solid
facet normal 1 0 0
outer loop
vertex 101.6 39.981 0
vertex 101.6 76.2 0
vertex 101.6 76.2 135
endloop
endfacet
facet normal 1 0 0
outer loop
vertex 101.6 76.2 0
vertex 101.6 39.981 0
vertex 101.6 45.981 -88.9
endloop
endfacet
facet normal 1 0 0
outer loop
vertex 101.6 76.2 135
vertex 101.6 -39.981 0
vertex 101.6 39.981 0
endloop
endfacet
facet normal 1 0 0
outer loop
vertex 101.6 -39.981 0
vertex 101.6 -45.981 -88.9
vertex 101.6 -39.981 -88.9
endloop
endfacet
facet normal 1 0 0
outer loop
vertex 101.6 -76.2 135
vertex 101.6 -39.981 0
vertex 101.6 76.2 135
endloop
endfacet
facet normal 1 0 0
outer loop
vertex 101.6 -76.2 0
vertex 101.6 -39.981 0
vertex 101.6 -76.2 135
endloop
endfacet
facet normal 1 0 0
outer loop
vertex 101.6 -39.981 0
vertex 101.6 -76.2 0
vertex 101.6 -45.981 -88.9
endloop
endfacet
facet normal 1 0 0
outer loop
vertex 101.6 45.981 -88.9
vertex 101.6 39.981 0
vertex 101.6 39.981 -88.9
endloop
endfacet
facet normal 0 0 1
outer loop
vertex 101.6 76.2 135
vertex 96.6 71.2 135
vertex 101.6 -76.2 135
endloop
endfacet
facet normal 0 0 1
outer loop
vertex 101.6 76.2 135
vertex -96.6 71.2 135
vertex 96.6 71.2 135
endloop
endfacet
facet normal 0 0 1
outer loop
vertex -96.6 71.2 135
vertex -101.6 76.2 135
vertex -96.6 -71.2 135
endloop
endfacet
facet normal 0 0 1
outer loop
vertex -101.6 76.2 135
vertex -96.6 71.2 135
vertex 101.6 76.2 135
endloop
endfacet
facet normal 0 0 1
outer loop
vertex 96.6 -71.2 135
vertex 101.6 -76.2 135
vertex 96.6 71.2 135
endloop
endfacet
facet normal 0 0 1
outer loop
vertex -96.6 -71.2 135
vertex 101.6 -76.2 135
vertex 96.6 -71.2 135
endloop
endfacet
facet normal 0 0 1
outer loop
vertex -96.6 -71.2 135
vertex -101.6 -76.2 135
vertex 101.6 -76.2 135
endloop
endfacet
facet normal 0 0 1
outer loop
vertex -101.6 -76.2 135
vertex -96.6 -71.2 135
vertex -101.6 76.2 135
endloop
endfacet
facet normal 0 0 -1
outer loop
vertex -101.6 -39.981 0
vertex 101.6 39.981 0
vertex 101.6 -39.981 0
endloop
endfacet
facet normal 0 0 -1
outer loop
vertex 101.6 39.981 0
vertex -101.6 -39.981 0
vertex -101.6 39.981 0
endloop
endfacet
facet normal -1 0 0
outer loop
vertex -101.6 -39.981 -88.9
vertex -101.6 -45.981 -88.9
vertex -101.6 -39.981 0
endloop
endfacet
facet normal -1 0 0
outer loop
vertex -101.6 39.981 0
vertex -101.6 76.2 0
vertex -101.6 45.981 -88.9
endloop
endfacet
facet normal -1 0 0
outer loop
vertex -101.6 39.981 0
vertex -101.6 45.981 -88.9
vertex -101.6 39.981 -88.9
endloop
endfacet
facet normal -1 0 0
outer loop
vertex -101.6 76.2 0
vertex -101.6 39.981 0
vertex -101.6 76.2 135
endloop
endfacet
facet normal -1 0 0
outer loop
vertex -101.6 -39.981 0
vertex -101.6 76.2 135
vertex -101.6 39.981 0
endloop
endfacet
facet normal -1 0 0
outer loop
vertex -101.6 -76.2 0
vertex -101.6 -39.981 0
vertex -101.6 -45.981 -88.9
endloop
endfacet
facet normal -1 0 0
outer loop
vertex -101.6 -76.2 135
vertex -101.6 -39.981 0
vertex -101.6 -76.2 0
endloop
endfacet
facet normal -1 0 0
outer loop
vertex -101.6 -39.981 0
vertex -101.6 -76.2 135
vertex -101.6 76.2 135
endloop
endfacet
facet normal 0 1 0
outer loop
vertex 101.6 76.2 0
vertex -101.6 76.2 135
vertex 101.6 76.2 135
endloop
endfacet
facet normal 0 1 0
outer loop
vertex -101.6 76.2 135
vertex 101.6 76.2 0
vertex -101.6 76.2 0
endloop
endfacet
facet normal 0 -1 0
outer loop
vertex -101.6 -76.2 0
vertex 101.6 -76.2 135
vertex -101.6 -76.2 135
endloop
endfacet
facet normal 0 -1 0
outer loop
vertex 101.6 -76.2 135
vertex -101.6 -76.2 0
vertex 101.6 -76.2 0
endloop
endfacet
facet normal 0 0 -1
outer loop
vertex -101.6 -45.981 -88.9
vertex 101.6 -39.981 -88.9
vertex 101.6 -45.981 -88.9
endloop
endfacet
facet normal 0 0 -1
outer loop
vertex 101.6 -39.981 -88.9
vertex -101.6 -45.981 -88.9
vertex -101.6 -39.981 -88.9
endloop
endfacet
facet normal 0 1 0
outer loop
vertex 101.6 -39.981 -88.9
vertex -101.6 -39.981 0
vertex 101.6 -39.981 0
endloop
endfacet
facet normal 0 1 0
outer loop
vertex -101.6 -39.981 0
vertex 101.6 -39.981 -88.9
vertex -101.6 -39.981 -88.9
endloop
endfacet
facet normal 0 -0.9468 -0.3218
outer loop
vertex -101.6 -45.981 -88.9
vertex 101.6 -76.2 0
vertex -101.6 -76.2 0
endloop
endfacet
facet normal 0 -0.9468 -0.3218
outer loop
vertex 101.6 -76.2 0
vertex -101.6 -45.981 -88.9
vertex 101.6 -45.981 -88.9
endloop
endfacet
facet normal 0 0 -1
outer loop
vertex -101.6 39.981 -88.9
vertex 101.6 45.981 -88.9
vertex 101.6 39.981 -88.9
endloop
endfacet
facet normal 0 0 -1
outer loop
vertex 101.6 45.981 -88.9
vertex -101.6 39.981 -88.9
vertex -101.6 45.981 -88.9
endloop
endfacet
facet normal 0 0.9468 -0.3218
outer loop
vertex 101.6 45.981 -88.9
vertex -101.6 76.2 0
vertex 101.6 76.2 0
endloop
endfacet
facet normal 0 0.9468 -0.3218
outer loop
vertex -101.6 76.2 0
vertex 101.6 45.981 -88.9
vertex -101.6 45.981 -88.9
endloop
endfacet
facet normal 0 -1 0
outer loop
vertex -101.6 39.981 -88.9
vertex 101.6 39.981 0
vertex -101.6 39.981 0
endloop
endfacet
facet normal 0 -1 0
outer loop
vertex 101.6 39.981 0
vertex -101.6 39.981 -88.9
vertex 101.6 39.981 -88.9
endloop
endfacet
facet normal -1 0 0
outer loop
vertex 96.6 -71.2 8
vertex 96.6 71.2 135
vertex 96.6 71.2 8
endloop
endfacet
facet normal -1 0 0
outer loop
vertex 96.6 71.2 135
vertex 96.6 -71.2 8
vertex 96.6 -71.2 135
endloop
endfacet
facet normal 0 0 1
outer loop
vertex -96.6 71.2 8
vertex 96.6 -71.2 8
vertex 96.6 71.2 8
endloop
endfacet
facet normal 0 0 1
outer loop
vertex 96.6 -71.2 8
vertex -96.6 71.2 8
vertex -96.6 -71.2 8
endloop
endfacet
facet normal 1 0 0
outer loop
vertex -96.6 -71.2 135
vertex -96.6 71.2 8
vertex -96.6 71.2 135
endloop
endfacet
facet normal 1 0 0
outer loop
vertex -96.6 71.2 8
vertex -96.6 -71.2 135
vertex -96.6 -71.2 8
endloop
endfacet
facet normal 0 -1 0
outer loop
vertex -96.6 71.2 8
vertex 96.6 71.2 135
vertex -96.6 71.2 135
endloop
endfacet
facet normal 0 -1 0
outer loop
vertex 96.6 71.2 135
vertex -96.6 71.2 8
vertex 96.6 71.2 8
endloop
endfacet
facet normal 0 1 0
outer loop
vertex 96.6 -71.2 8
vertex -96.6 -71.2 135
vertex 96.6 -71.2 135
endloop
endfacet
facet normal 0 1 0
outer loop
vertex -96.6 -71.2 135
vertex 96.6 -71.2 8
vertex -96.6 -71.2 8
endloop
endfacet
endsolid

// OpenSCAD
/* ============================================================
   Cubicle Wall Planter Saddle - by Boyo Labs

   A self-contained planter trough that saddles a 3.03" cubicle
   wall. Lofted arms grip both faces of the wall panel.

   Units: mm  (1 inch = 25.4 mm)
   ============================================================ */

$fn = 64;
inch = 25.4;

// ─── Parameters ──────────────────────────────────────────────

wall_thick      = 3.03 * inch;  // cubicle wall thickness          (76.96 mm)
planter_length  = 8.00 * inch;  // planter length along wall        (203.2 mm)
planter_depth   = 6.00 * inch;  // planter depth front-to-back     (152.4 mm)
planter_height  = 5.00 * inch;  // interior soil depth             (127.0 mm)
wall_t          = 5.0;          // planter wall thickness            mm
floor_t         = 8.0;          // planter floor thickness           mm
arm_drop        = 3.50 * inch;  // grip arm length below planter    (88.9 mm)
arm_t           = 6.0;          // grip arm thickness                mm
fit_gap         = 1.5;          // clearance per wall face           mm

// ─── Derived ─────────────────────────────────────────────────

channel      = wall_thick + 2 * fit_gap;              // slot opening (~80 mm)
overhang     = (planter_depth - channel) / 2 - arm_t; // overhang per wall face
total_height = floor_t + planter_height;

assert(overhang >= 0,
  "planter_depth too narrow — increase planter_depth so it clears the wall.");

front_arm_y  = overhang;
back_arm_y   = overhang + arm_t + channel;

// ─── Model ───────────────────────────────────────────────────

module planter_saddle() {
    difference() {
        union() {

            // ── Planter outer shell ──────────────────────────
            // Solid box; interior removed below via difference()
            cube([planter_length, planter_depth, total_height]);

            // ── Lofted front grip arm ────────────────────────
            // z = 0: spans full front overhang (y = 0 → front_arm_y + arm_t)
            // z = -arm_drop: just the grip arm (arm_t thick)
            hull() {
                cube([planter_length, front_arm_y + arm_t, 0.1]);
                translate([0, front_arm_y, -arm_drop])
                    cube([planter_length, arm_t, 0.1]);
            }

            // ── Lofted back grip arm ─────────────────────────
            // z = 0: spans full back overhang (y = back_arm_y → planter_depth)
            // z = -arm_drop: just the grip arm (arm_t thick)
            hull() {
                translate([0, back_arm_y, 0])
                    cube([planter_length, planter_depth - back_arm_y, 0.1]);
                translate([0, back_arm_y, -arm_drop])
                    cube([planter_length, arm_t, 0.1]);
            }
        }

        // ── Interior cavity (soil space) ─────────────────────
        // Starts at floor_t, leaving a solid floor; open at the top
        translate([wall_t, wall_t, floor_t])
            cube([planter_length - 2 * wall_t,
                  planter_depth  - 2 * wall_t,
                  planter_height + 1]);         // +1 ensures clean open top

    }
}

// Center on X/Y for display; arms hang in -Z
translate([-planter_length / 2, -planter_depth / 2, 0])
    planter_saddle();


/* ─── Key dimensions ───────────────────────────────────────────
   Outer shell:      8.0" × 6.0" × (floor + 5.0" walls)
   Interior (soil):  ~7.6" × ~5.6" × 5.0" deep
   Wall slot:        ~80 mm / ~3.15" (3.03" wall + 1.5 mm per side)
   Arm drop:         2.5" below planter floor
   ─────────────────────────────────────────────────────────── */
